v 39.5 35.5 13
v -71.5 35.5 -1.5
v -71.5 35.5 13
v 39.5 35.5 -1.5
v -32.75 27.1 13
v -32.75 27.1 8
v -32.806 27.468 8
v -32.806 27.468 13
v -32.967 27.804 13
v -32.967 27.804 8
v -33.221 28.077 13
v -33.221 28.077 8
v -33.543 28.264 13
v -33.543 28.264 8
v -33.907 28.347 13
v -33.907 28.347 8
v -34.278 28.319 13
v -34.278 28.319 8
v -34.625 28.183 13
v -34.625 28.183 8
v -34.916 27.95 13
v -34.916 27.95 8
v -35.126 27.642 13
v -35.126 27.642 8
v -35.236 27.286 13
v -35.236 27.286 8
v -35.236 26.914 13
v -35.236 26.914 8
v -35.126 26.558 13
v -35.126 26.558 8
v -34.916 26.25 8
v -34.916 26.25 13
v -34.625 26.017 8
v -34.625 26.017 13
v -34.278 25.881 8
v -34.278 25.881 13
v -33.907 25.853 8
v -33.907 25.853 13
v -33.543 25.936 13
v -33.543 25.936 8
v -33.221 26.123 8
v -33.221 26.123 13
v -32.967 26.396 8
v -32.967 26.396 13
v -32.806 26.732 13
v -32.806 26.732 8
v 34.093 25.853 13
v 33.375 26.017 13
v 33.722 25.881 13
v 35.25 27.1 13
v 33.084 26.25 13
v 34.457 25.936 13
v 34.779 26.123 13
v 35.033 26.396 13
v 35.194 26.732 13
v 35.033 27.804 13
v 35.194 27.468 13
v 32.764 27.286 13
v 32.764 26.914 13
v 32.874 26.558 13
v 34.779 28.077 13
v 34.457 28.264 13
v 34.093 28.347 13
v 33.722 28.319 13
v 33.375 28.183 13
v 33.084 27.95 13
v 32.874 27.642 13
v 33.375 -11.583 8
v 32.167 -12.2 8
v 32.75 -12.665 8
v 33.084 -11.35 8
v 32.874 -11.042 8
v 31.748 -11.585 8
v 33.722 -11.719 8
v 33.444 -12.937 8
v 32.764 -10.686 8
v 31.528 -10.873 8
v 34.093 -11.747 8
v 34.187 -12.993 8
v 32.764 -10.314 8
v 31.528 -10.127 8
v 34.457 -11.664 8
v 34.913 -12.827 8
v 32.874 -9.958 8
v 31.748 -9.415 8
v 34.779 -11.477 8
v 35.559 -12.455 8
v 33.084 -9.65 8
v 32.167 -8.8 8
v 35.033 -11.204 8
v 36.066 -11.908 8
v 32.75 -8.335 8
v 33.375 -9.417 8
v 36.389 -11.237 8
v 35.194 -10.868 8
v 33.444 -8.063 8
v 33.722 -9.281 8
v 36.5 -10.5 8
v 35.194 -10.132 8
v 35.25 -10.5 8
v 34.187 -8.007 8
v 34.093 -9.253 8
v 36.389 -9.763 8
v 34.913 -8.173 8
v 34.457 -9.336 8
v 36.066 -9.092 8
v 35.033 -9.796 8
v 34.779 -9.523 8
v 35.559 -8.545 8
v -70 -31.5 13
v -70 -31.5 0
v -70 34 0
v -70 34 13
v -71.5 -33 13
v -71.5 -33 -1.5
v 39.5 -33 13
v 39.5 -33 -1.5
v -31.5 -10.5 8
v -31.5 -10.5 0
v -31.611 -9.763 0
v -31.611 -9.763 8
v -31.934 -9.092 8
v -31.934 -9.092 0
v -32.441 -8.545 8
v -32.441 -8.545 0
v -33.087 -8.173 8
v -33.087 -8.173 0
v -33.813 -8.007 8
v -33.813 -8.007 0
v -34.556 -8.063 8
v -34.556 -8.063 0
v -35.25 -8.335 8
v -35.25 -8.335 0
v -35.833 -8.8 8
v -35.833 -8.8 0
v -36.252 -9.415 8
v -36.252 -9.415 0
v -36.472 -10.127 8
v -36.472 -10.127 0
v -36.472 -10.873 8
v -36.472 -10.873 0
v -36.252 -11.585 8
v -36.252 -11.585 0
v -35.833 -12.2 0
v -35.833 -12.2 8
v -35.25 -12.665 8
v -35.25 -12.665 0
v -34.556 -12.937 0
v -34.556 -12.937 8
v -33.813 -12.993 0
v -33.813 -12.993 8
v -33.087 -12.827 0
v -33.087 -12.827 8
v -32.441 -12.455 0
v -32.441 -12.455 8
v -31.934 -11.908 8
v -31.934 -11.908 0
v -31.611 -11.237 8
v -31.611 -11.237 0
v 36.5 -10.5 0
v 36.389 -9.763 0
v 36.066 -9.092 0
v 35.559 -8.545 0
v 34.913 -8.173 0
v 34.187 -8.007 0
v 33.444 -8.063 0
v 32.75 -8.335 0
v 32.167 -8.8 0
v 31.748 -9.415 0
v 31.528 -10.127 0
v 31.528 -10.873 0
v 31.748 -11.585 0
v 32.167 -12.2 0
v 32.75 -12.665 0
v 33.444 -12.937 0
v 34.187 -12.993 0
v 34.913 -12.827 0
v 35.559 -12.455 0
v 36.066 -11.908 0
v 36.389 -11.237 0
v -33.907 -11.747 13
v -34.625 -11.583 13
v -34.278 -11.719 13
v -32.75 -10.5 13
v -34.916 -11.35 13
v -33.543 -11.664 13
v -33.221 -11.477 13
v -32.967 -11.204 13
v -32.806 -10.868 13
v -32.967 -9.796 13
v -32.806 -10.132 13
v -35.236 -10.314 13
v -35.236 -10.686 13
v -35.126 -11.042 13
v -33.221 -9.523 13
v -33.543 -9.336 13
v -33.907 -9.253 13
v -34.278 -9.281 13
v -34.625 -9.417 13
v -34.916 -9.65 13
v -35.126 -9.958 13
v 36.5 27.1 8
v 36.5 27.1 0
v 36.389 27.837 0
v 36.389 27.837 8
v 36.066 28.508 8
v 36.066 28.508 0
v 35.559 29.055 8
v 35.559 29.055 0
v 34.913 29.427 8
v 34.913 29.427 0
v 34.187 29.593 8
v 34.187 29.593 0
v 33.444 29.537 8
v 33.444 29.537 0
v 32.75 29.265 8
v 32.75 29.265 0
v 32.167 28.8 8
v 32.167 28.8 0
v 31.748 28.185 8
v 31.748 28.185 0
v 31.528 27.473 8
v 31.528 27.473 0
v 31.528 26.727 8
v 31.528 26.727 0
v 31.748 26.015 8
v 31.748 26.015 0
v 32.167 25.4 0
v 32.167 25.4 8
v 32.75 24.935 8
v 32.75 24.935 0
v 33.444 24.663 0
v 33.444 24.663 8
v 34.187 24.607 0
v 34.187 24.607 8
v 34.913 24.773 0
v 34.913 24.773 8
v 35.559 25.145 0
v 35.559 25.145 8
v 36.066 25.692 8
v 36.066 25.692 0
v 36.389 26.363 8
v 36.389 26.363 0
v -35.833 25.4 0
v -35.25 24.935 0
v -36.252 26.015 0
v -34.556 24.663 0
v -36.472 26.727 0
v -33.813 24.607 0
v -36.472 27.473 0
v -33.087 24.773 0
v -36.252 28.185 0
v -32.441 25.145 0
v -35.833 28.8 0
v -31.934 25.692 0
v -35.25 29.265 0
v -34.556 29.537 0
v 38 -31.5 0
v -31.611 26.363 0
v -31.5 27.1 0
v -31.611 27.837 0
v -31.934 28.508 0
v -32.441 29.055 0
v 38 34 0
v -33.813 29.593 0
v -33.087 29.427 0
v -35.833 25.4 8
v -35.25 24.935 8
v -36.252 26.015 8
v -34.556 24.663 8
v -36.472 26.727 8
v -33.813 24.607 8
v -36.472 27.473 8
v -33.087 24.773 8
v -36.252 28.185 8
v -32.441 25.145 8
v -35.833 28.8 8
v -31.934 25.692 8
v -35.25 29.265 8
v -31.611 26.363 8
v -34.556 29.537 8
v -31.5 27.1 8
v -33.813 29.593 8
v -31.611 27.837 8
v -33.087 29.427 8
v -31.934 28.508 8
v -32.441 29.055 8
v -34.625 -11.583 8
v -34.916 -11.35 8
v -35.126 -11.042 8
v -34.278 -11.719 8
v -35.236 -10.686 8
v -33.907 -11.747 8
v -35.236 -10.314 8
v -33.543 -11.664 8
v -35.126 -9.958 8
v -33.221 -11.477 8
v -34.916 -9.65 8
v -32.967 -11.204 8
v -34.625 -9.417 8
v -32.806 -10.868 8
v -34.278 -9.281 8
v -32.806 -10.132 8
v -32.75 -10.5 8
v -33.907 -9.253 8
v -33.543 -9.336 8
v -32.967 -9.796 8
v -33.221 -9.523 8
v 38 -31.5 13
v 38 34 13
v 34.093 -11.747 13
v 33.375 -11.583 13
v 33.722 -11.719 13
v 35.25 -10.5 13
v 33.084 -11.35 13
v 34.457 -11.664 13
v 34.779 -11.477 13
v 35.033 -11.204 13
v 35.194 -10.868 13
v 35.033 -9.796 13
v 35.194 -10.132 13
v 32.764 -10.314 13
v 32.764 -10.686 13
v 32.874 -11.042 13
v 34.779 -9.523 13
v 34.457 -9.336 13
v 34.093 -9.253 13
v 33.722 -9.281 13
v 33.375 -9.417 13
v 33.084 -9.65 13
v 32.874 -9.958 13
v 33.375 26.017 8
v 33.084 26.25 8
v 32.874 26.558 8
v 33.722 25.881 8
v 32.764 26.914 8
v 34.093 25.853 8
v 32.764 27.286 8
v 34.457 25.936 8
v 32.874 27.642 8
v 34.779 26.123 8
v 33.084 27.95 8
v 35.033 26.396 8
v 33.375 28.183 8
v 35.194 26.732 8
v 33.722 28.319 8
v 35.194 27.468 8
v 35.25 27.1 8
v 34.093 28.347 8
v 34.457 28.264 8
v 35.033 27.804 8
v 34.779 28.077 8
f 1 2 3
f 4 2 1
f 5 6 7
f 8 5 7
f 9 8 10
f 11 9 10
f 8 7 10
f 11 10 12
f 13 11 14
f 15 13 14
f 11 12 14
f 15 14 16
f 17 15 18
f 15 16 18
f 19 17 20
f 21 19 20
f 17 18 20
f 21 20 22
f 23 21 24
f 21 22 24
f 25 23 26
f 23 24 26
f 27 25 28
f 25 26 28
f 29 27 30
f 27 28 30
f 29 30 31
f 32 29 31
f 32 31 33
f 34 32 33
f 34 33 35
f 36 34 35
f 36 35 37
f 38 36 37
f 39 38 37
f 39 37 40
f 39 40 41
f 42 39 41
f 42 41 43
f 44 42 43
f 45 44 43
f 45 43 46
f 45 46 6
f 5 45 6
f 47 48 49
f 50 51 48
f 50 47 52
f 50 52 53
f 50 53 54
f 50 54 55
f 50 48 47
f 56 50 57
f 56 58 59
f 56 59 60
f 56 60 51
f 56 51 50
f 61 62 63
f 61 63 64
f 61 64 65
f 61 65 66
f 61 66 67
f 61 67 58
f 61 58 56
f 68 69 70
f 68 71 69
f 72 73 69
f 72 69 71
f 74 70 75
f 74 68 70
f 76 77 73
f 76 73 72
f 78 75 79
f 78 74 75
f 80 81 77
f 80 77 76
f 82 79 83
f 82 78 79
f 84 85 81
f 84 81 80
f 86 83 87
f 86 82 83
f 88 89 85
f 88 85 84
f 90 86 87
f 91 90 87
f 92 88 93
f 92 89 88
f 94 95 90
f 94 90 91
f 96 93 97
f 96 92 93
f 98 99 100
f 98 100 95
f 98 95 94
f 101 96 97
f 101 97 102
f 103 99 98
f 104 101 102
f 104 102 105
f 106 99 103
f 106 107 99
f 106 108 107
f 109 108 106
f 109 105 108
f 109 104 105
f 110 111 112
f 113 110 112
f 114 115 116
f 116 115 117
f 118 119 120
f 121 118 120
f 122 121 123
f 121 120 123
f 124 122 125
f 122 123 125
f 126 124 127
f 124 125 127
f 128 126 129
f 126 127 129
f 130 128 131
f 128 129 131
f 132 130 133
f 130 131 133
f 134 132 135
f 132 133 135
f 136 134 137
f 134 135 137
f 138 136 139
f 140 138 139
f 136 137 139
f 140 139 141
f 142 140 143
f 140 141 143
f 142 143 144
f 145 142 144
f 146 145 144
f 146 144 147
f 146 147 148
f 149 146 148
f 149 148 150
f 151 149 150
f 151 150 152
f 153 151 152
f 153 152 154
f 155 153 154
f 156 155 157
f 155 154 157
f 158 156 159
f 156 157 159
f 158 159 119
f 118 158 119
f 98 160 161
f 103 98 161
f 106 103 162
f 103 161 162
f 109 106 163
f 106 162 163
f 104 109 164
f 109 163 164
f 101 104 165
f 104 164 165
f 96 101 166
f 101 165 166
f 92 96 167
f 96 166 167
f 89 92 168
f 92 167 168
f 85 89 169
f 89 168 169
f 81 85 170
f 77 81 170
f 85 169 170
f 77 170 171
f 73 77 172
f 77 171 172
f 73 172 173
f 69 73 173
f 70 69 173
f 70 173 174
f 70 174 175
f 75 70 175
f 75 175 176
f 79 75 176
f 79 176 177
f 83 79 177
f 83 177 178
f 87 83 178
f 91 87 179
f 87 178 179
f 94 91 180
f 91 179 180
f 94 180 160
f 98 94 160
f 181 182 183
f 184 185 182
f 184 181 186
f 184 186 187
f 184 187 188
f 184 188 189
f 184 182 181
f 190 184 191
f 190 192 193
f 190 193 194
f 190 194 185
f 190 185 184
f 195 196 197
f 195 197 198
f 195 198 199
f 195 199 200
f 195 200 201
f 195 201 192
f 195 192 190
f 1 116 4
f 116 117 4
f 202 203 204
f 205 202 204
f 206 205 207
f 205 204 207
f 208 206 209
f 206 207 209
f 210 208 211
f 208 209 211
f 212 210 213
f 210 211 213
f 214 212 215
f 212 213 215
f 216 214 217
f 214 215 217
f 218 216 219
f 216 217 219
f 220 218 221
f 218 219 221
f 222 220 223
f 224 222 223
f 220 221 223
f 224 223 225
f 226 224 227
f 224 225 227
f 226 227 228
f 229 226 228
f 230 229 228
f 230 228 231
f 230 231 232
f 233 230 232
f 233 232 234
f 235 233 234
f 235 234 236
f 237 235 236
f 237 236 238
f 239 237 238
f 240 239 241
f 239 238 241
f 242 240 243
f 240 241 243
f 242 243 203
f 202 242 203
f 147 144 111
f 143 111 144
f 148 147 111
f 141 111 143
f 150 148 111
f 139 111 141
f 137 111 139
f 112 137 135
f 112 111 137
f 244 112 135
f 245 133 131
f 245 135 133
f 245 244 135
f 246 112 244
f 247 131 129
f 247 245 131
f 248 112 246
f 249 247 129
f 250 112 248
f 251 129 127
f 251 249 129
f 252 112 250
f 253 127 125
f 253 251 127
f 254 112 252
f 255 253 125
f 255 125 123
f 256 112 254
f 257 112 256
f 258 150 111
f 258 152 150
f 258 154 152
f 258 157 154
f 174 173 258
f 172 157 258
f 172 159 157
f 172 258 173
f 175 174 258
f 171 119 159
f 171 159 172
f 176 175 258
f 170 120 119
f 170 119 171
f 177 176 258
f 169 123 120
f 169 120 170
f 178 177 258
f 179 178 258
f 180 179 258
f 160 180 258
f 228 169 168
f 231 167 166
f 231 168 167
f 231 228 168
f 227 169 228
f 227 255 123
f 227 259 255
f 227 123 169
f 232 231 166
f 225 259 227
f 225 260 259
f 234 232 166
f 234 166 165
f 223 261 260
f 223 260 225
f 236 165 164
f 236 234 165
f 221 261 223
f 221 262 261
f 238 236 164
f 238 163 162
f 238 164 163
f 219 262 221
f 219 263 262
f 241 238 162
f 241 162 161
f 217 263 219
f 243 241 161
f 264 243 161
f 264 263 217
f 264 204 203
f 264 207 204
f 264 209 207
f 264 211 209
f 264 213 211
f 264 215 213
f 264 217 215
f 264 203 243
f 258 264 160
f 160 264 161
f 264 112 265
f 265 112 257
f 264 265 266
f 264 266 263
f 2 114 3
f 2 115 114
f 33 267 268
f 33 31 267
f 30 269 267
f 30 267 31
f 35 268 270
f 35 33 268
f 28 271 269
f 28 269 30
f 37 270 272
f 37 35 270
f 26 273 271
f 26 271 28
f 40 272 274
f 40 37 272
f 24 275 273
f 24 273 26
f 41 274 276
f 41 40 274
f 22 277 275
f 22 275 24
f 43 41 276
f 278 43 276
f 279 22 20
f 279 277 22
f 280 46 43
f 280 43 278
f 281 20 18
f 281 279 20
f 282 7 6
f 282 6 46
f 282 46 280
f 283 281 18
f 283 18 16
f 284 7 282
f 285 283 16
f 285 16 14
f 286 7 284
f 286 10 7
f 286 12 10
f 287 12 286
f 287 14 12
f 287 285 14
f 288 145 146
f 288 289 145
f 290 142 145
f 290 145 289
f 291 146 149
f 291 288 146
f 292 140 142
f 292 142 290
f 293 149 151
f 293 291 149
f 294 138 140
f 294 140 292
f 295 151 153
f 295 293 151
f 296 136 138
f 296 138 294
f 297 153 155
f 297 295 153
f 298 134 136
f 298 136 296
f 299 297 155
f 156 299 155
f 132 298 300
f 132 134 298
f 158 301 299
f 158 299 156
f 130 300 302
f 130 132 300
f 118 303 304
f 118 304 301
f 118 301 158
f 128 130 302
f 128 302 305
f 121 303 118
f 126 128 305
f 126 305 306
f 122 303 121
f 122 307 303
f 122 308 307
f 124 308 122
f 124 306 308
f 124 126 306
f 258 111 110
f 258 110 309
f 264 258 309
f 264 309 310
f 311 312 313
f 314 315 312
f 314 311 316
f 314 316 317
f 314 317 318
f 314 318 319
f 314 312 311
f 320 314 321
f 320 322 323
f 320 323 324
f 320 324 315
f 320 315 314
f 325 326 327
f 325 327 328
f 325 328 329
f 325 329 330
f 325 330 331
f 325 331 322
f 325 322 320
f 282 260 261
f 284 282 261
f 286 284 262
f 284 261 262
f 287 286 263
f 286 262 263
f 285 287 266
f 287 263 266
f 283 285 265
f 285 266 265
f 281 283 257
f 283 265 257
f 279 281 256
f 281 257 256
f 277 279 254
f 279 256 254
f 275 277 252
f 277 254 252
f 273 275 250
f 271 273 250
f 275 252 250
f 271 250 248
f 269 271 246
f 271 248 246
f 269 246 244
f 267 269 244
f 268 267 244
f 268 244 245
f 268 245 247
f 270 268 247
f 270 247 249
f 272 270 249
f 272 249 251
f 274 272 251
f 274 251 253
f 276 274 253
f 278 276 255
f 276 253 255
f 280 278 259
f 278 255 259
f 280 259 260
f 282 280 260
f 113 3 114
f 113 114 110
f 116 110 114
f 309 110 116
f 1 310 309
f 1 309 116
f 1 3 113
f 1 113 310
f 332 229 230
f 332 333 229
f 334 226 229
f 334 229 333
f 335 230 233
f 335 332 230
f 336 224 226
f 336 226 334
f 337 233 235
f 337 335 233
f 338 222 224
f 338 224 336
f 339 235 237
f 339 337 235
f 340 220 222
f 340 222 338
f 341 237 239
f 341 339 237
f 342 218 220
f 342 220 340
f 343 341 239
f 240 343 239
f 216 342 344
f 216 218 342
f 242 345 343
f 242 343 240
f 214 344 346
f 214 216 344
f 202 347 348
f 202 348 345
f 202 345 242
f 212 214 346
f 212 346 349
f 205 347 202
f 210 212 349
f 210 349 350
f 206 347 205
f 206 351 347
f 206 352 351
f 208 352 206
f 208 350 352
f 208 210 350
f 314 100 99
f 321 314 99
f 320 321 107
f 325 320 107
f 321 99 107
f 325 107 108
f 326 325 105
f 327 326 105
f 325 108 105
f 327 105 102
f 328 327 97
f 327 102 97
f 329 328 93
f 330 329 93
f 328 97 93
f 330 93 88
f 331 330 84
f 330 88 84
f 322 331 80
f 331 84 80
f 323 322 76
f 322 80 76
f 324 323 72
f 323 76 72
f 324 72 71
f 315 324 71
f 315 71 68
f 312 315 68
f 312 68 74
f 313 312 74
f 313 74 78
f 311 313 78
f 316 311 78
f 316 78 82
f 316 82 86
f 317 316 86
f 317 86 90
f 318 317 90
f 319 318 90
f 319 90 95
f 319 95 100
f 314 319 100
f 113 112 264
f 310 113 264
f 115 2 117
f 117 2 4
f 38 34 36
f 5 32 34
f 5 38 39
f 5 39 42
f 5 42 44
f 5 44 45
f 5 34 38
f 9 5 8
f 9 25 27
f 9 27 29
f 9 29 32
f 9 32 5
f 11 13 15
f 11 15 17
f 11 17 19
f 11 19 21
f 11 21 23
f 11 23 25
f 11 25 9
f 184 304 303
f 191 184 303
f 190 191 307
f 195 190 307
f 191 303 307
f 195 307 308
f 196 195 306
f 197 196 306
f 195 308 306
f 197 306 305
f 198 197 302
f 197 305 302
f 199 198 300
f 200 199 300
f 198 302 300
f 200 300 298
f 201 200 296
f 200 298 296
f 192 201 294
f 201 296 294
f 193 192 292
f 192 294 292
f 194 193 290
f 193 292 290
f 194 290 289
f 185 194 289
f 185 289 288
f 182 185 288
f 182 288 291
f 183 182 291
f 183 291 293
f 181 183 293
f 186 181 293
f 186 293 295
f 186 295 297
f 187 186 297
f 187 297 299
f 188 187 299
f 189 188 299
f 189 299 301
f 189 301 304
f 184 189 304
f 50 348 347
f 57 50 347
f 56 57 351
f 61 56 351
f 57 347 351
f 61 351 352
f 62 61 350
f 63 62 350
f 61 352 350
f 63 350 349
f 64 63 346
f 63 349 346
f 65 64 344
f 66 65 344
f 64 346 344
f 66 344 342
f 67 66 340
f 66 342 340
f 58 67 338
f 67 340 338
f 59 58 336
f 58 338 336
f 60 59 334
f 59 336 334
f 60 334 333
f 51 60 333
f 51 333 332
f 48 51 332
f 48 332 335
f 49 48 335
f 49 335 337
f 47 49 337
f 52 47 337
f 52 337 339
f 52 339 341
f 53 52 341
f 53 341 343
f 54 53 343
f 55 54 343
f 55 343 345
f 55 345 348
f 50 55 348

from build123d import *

# Parameters (mm, degrees)
F0_W     = 111
F0_H     = 68.5
F0_W_2   = 108
F0_H_2   = 65.5
F0_R     = 2.5
F0_R_2   = 1.25
F1_DEPTH = 1.5
F2_DEPTH = 13
F3_DEPTH = 8


with BuildPart() as f1:
    # F0 (on Top) → F1 (new body)
    with BuildSketch(Plane.XY):
        with Locations((-16, 1.25)):
            Rectangle(F0_W, F0_H)
        with Locations((-16, 1.25)):
            Rectangle(F0_W_2, F0_H_2, mode=Mode.SUBTRACT)
        with Locations((-16, 1.25)):
            Rectangle(F0_W_2, F0_H_2)
        with Locations((-34, -10.5)):
            Circle(F0_R, mode=Mode.SUBTRACT)
        with Locations((34, -10.5)):
            Circle(F0_R, mode=Mode.SUBTRACT)
        with Locations((-34, 27.1)):
            Circle(F0_R, mode=Mode.SUBTRACT)
        with Locations((34, 27.1)):
            Circle(F0_R, mode=Mode.SUBTRACT)
        with Locations((-34, -10.5)):
            Circle(F0_R)
        with Locations((-34, -10.5)):
            Circle(F0_R_2, mode=Mode.SUBTRACT)
        with Locations((-34, -10.5)):
            Circle(F0_R_2)
        with Locations((34, -10.5)):
            Circle(F0_R)
        with Locations((34, -10.5)):
            Circle(F0_R_2, mode=Mode.SUBTRACT)
        with Locations((34, -10.5)):
            Circle(F0_R_2)
        with Locations((34, 27.1)):
            Circle(F0_R)
        with Locations((34, 27.1)):
            Circle(F0_R_2, mode=Mode.SUBTRACT)
        with Locations((34, 27.1)):
            Circle(F0_R_2)
        with Locations((-34, 27.1)):
            Circle(F0_R)
        with Locations((-34, 27.1)):
            Circle(F0_R_2, mode=Mode.SUBTRACT)
        with Locations((-34, 27.1)):
            Circle(F0_R_2)
    extrude(amount=-F1_DEPTH)

    # F0 (on Top) → F2 (join)
    with BuildSketch(Plane.XY):
        with Locations((-16, 1.25)):
            Rectangle(F0_W, F0_H)
        with Locations((-16, 1.25)):
            Rectangle(F0_W_2, F0_H_2, mode=Mode.SUBTRACT)
        with Locations((-34, 27.1)):
            Circle(F0_R_2)
        with Locations((34, 27.1)):
            Circle(F0_R_2)
        with Locations((34, -10.5)):
            Circle(F0_R_2)
        with Locations((-34, -10.5)):
            Circle(F0_R_2)
    extrude(amount=F2_DEPTH)

    # F0 (on Top) → F3 (join)
    with BuildSketch(Plane.XY):
        with Locations((-34, 27.1)):
            Circle(F0_R)
        with Locations((-34, 27.1)):
            Circle(F0_R_2, mode=Mode.SUBTRACT)
        with Locations((-34, -10.5)):
            Circle(F0_R)
        with Locations((-34, -10.5)):
            Circle(F0_R_2, mode=Mode.SUBTRACT)
        with Locations((34, 27.1)):
            Circle(F0_R)
        with Locations((34, 27.1)):
            Circle(F0_R_2, mode=Mode.SUBTRACT)
        with Locations((34, -10.5)):
            Circle(F0_R)
        with Locations((34, -10.5)):
            Circle(F0_R_2, mode=Mode.SUBTRACT)
    extrude(amount=F3_DEPTH)


solid = f1.part
